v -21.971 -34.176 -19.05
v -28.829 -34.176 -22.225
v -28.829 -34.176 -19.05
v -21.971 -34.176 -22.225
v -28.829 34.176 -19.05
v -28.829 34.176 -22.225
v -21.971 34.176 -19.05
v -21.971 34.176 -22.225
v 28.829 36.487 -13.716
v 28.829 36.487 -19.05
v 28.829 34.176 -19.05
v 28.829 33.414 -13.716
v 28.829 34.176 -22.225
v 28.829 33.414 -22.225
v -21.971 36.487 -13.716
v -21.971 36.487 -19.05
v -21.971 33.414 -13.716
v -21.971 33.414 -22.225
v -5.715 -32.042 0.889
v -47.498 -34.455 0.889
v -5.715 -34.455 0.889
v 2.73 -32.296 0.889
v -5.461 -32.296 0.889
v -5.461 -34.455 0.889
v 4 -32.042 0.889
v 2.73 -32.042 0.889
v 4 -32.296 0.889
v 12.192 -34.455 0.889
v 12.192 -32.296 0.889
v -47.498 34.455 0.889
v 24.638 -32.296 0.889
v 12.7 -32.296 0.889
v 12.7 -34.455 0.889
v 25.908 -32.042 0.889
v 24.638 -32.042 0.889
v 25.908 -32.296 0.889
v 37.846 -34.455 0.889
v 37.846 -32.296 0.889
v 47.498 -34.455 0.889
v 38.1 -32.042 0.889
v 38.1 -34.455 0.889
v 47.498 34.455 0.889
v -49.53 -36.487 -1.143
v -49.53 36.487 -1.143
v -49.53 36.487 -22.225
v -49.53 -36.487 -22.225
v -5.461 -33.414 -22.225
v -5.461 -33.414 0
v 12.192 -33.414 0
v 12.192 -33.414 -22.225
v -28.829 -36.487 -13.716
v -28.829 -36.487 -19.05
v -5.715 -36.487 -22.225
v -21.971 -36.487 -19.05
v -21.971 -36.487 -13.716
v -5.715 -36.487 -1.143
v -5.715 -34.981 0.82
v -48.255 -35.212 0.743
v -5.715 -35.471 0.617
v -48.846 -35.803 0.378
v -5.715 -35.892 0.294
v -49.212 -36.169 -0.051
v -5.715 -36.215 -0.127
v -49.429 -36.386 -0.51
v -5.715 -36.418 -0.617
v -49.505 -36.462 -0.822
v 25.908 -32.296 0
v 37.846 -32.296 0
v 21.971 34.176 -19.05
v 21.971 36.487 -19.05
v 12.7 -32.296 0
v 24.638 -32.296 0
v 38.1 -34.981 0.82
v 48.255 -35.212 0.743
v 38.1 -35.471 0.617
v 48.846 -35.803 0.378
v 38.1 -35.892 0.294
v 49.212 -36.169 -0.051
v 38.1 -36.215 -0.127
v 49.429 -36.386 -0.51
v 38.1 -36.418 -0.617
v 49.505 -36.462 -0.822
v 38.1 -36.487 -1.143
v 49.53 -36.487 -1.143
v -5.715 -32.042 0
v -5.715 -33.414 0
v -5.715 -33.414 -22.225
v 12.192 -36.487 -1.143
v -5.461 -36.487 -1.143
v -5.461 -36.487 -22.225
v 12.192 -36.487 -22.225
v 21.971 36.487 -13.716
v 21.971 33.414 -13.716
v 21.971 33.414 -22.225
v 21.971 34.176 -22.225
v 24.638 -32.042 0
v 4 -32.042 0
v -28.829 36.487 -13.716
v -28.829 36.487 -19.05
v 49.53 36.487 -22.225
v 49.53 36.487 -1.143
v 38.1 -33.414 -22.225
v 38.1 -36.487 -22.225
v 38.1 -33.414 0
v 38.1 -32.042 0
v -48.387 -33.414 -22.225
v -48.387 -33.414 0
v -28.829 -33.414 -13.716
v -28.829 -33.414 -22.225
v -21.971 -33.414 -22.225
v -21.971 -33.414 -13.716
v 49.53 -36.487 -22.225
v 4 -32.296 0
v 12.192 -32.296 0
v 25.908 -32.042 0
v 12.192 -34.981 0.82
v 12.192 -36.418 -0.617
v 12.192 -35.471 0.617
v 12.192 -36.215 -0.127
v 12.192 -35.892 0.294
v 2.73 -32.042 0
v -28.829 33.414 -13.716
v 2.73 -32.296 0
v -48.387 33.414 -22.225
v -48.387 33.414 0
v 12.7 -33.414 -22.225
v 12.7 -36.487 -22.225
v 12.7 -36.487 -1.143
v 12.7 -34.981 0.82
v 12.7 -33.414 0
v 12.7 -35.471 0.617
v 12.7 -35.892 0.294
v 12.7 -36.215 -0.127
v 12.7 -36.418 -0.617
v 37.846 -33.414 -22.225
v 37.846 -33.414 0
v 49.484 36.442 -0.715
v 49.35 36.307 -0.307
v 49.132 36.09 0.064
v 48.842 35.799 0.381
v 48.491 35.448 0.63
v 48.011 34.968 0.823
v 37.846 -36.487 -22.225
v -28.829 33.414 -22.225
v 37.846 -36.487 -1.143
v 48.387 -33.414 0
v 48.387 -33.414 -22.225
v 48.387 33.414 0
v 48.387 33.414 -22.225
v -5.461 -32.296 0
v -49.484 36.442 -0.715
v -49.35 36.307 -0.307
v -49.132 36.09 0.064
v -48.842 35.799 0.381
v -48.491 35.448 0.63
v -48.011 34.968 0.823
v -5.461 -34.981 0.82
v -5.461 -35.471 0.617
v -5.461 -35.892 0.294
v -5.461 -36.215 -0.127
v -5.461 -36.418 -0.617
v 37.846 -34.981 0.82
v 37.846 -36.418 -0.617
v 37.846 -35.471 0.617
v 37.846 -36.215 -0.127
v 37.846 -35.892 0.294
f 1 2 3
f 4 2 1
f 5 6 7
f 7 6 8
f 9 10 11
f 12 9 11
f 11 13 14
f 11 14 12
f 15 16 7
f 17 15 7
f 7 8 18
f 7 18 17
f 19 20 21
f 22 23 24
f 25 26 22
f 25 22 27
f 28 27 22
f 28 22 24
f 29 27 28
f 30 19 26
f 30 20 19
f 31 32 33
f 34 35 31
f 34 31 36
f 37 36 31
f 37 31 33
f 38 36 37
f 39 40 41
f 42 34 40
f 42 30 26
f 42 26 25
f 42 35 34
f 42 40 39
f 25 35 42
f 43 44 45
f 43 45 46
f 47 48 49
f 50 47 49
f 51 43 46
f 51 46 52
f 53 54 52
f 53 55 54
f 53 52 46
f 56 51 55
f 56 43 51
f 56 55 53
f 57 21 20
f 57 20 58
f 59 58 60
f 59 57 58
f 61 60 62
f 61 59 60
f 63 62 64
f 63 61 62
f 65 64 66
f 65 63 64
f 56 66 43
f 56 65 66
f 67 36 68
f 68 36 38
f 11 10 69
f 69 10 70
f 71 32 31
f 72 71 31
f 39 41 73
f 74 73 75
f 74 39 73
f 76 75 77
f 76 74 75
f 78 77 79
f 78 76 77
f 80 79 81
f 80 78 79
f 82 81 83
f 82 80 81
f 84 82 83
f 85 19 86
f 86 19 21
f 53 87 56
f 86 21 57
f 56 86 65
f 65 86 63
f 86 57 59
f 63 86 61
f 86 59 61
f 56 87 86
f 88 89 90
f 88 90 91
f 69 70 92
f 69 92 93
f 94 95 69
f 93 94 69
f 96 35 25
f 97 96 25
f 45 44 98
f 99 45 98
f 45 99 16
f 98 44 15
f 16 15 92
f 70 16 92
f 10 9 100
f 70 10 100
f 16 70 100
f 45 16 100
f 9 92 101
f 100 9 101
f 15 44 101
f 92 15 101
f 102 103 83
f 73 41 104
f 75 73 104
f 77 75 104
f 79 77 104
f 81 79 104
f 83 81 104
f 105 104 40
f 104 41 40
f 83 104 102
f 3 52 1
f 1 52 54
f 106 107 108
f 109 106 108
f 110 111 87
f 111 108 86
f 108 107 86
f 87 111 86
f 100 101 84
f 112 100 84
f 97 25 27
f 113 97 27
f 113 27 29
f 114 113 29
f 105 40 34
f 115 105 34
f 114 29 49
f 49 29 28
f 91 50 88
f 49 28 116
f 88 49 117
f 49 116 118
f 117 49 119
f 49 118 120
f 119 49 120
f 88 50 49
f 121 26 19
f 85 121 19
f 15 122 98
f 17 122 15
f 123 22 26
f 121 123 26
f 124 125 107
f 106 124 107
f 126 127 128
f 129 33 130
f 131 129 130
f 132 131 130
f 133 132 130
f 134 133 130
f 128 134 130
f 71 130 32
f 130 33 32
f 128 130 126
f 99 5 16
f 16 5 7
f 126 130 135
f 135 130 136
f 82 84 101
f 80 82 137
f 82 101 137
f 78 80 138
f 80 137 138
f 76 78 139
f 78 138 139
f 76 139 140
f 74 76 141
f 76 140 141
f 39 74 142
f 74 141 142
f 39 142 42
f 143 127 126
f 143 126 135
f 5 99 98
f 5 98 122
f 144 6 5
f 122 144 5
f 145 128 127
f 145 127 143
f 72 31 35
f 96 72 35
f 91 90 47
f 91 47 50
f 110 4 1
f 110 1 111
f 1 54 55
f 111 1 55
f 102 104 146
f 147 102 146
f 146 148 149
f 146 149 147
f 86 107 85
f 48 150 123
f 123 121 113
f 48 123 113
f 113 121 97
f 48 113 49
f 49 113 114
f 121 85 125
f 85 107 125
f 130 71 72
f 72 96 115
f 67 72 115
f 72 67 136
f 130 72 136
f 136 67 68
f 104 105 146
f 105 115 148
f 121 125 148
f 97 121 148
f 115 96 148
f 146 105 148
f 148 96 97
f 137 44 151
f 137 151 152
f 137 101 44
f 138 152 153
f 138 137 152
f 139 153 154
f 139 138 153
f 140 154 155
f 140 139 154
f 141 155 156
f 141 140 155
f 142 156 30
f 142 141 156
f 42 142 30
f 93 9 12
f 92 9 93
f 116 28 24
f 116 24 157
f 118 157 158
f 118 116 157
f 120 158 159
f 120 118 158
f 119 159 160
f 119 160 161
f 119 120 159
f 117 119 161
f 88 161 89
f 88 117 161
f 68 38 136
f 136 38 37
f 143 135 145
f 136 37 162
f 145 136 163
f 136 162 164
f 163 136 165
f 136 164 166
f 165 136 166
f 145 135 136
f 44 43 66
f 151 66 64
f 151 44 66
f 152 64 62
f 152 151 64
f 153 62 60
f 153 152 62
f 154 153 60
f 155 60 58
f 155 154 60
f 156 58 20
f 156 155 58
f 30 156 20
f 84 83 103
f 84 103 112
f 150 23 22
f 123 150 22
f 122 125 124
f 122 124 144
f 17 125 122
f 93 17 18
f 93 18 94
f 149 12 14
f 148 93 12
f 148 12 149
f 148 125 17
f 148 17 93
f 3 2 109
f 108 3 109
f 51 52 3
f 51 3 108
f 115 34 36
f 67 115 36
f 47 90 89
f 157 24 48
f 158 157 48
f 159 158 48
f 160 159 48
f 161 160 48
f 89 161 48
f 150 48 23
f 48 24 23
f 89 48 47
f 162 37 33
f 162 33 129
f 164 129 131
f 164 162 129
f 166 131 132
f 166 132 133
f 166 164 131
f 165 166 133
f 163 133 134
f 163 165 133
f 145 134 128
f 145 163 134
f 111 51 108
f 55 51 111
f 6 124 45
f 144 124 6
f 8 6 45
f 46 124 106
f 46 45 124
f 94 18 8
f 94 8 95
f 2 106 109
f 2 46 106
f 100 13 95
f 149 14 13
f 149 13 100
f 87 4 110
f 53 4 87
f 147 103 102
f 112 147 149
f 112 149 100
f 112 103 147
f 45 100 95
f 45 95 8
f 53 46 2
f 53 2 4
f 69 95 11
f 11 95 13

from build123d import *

# Parameters (mm, degrees)
F0_W      = 99.06
F0_H      = 72.9742
F1_DEPTH  = 0.889
F2_W      = 99.06
F2_H      = 72.9742
F2_W_2    = 96.774
F2_H_2    = 66.8274
F3_DEPTH  = 22.225
F4_R      = 2.032
F6_DEPTH  = 25.4
F8_DEPTH  = 25.4
F10_W     = 6.858
F10_H     = 5.334
F11_DEPTH = 72.9752
F12_W     = 6.858
F12_H     = 0.762
F13_DEPTH = 3.175
F15_W     = 6.858
F15_H     = 5.334
F16_DEPTH = 3.0734
F17_W     = 6.858
F17_H     = 0.762
F18_DEPTH = 3.175


with BuildPart() as f1:
    # F0 (on Top) → F1 (new body)
    with BuildSketch(Plane.XY):
        Rectangle(F0_W, F0_H)
    extrude(amount=F1_DEPTH)

    # F2 (on face) → F3 (join)
    with BuildSketch(Plane(origin=(0, 0, 0), x_dir=(1, 0, 0), z_dir=(0, 0, -1))):
        Rectangle(F2_W, F2_H)
        Rectangle(F2_W_2, F2_H_2, mode=Mode.SUBTRACT)
    extrude(amount=F3_DEPTH)

    # F4
    f4_edges = [f1.edges().sort_by_distance(p)[0] for p in [
        (0, -36.4871, 0.889),
        (49.53, 0, 0.889),
        (0, 36.4871, 0.889),
        (-49.53, 0, 0.889),
    ]]
    fillet(f4_edges, radius=F4_R)

    # F5 (on face) → F6 (cut)
    with BuildSketch(Plane.XY.offset(0.889)):
        Polygon((24.638, -32.0421), (12.446, -32.0421), (12.446, -36.4871), (12.7, -36.4871), (12.7, -32.2961), (24.638, -32.2961), align=None)
        Polygon((38.1, -36.4871), (38.1, -32.0421), (25.908, -32.0421), (25.908, -32.2961), (37.846, -32.2961), (37.846, -36.4871), align=None)
    extrude(amount=-F6_DEPTH, mode=Mode.SUBTRACT)

    # F7 (on face) → F8 (cut)
    with BuildSketch(Plane.XY.offset(0.889)):
        Polygon((12.446, -32.0421), (4.0005, -32.0421), (4.0005, -32.2961), (12.192, -32.2961), (12.192, -36.4871), (12.446, -36.4871), align=None)
        Polygon((2.7305, -32.2961), (2.7305, -32.0421), (-5.715, -32.0421), (-5.715, -36.4871), (-5.461, -36.4871), (-5.461, -32.2961), align=None)
    extrude(amount=-F8_DEPTH, mode=Mode.SUBTRACT)

    # F10 (on face) → F11 (cut, through all)
    with BuildSketch(Plane.XZ.offset(36.4871)):
        with Locations((-25.4, -16.383)):
            Rectangle(F10_W, F10_H)
    extrude(amount=-F11_DEPTH, mode=Mode.SUBTRACT)

    # F12 (on face) → F13 (cut, through all)
    with BuildSketch(Plane(origin=(0, 0, -22.225), x_dir=(1, 0, 0), z_dir=(0, 0, -1))):
        with Locations((-25.4, 33.7947)):
            Rectangle(F12_W, F12_H)
        with Locations((-25.4, -33.7947)):
            Rectangle(F12_W, F12_H)
    extrude(amount=-F13_DEPTH, mode=Mode.SUBTRACT)

    # F15 (on face) → F16 (cut, through all)
    with BuildSketch(Plane(origin=(0, 36.4871, 0), x_dir=(-1, 0, 0), z_dir=(0, 1, 0))):
        with Locations((-25.4, -16.383)):
            Rectangle(F15_W, F15_H)
    extrude(amount=-F16_DEPTH, mode=Mode.SUBTRACT)

    # F17 (on face) → F18 (cut, through all)
    with BuildSketch(Plane(origin=(0, 0, -22.225), x_dir=(1, 0, 0), z_dir=(0, 0, -1))):
        with Locations((25.4, -33.7947)):
            Rectangle(F17_W, F17_H)
    extrude(amount=-F18_DEPTH, mode=Mode.SUBTRACT)


solid = f1.part
